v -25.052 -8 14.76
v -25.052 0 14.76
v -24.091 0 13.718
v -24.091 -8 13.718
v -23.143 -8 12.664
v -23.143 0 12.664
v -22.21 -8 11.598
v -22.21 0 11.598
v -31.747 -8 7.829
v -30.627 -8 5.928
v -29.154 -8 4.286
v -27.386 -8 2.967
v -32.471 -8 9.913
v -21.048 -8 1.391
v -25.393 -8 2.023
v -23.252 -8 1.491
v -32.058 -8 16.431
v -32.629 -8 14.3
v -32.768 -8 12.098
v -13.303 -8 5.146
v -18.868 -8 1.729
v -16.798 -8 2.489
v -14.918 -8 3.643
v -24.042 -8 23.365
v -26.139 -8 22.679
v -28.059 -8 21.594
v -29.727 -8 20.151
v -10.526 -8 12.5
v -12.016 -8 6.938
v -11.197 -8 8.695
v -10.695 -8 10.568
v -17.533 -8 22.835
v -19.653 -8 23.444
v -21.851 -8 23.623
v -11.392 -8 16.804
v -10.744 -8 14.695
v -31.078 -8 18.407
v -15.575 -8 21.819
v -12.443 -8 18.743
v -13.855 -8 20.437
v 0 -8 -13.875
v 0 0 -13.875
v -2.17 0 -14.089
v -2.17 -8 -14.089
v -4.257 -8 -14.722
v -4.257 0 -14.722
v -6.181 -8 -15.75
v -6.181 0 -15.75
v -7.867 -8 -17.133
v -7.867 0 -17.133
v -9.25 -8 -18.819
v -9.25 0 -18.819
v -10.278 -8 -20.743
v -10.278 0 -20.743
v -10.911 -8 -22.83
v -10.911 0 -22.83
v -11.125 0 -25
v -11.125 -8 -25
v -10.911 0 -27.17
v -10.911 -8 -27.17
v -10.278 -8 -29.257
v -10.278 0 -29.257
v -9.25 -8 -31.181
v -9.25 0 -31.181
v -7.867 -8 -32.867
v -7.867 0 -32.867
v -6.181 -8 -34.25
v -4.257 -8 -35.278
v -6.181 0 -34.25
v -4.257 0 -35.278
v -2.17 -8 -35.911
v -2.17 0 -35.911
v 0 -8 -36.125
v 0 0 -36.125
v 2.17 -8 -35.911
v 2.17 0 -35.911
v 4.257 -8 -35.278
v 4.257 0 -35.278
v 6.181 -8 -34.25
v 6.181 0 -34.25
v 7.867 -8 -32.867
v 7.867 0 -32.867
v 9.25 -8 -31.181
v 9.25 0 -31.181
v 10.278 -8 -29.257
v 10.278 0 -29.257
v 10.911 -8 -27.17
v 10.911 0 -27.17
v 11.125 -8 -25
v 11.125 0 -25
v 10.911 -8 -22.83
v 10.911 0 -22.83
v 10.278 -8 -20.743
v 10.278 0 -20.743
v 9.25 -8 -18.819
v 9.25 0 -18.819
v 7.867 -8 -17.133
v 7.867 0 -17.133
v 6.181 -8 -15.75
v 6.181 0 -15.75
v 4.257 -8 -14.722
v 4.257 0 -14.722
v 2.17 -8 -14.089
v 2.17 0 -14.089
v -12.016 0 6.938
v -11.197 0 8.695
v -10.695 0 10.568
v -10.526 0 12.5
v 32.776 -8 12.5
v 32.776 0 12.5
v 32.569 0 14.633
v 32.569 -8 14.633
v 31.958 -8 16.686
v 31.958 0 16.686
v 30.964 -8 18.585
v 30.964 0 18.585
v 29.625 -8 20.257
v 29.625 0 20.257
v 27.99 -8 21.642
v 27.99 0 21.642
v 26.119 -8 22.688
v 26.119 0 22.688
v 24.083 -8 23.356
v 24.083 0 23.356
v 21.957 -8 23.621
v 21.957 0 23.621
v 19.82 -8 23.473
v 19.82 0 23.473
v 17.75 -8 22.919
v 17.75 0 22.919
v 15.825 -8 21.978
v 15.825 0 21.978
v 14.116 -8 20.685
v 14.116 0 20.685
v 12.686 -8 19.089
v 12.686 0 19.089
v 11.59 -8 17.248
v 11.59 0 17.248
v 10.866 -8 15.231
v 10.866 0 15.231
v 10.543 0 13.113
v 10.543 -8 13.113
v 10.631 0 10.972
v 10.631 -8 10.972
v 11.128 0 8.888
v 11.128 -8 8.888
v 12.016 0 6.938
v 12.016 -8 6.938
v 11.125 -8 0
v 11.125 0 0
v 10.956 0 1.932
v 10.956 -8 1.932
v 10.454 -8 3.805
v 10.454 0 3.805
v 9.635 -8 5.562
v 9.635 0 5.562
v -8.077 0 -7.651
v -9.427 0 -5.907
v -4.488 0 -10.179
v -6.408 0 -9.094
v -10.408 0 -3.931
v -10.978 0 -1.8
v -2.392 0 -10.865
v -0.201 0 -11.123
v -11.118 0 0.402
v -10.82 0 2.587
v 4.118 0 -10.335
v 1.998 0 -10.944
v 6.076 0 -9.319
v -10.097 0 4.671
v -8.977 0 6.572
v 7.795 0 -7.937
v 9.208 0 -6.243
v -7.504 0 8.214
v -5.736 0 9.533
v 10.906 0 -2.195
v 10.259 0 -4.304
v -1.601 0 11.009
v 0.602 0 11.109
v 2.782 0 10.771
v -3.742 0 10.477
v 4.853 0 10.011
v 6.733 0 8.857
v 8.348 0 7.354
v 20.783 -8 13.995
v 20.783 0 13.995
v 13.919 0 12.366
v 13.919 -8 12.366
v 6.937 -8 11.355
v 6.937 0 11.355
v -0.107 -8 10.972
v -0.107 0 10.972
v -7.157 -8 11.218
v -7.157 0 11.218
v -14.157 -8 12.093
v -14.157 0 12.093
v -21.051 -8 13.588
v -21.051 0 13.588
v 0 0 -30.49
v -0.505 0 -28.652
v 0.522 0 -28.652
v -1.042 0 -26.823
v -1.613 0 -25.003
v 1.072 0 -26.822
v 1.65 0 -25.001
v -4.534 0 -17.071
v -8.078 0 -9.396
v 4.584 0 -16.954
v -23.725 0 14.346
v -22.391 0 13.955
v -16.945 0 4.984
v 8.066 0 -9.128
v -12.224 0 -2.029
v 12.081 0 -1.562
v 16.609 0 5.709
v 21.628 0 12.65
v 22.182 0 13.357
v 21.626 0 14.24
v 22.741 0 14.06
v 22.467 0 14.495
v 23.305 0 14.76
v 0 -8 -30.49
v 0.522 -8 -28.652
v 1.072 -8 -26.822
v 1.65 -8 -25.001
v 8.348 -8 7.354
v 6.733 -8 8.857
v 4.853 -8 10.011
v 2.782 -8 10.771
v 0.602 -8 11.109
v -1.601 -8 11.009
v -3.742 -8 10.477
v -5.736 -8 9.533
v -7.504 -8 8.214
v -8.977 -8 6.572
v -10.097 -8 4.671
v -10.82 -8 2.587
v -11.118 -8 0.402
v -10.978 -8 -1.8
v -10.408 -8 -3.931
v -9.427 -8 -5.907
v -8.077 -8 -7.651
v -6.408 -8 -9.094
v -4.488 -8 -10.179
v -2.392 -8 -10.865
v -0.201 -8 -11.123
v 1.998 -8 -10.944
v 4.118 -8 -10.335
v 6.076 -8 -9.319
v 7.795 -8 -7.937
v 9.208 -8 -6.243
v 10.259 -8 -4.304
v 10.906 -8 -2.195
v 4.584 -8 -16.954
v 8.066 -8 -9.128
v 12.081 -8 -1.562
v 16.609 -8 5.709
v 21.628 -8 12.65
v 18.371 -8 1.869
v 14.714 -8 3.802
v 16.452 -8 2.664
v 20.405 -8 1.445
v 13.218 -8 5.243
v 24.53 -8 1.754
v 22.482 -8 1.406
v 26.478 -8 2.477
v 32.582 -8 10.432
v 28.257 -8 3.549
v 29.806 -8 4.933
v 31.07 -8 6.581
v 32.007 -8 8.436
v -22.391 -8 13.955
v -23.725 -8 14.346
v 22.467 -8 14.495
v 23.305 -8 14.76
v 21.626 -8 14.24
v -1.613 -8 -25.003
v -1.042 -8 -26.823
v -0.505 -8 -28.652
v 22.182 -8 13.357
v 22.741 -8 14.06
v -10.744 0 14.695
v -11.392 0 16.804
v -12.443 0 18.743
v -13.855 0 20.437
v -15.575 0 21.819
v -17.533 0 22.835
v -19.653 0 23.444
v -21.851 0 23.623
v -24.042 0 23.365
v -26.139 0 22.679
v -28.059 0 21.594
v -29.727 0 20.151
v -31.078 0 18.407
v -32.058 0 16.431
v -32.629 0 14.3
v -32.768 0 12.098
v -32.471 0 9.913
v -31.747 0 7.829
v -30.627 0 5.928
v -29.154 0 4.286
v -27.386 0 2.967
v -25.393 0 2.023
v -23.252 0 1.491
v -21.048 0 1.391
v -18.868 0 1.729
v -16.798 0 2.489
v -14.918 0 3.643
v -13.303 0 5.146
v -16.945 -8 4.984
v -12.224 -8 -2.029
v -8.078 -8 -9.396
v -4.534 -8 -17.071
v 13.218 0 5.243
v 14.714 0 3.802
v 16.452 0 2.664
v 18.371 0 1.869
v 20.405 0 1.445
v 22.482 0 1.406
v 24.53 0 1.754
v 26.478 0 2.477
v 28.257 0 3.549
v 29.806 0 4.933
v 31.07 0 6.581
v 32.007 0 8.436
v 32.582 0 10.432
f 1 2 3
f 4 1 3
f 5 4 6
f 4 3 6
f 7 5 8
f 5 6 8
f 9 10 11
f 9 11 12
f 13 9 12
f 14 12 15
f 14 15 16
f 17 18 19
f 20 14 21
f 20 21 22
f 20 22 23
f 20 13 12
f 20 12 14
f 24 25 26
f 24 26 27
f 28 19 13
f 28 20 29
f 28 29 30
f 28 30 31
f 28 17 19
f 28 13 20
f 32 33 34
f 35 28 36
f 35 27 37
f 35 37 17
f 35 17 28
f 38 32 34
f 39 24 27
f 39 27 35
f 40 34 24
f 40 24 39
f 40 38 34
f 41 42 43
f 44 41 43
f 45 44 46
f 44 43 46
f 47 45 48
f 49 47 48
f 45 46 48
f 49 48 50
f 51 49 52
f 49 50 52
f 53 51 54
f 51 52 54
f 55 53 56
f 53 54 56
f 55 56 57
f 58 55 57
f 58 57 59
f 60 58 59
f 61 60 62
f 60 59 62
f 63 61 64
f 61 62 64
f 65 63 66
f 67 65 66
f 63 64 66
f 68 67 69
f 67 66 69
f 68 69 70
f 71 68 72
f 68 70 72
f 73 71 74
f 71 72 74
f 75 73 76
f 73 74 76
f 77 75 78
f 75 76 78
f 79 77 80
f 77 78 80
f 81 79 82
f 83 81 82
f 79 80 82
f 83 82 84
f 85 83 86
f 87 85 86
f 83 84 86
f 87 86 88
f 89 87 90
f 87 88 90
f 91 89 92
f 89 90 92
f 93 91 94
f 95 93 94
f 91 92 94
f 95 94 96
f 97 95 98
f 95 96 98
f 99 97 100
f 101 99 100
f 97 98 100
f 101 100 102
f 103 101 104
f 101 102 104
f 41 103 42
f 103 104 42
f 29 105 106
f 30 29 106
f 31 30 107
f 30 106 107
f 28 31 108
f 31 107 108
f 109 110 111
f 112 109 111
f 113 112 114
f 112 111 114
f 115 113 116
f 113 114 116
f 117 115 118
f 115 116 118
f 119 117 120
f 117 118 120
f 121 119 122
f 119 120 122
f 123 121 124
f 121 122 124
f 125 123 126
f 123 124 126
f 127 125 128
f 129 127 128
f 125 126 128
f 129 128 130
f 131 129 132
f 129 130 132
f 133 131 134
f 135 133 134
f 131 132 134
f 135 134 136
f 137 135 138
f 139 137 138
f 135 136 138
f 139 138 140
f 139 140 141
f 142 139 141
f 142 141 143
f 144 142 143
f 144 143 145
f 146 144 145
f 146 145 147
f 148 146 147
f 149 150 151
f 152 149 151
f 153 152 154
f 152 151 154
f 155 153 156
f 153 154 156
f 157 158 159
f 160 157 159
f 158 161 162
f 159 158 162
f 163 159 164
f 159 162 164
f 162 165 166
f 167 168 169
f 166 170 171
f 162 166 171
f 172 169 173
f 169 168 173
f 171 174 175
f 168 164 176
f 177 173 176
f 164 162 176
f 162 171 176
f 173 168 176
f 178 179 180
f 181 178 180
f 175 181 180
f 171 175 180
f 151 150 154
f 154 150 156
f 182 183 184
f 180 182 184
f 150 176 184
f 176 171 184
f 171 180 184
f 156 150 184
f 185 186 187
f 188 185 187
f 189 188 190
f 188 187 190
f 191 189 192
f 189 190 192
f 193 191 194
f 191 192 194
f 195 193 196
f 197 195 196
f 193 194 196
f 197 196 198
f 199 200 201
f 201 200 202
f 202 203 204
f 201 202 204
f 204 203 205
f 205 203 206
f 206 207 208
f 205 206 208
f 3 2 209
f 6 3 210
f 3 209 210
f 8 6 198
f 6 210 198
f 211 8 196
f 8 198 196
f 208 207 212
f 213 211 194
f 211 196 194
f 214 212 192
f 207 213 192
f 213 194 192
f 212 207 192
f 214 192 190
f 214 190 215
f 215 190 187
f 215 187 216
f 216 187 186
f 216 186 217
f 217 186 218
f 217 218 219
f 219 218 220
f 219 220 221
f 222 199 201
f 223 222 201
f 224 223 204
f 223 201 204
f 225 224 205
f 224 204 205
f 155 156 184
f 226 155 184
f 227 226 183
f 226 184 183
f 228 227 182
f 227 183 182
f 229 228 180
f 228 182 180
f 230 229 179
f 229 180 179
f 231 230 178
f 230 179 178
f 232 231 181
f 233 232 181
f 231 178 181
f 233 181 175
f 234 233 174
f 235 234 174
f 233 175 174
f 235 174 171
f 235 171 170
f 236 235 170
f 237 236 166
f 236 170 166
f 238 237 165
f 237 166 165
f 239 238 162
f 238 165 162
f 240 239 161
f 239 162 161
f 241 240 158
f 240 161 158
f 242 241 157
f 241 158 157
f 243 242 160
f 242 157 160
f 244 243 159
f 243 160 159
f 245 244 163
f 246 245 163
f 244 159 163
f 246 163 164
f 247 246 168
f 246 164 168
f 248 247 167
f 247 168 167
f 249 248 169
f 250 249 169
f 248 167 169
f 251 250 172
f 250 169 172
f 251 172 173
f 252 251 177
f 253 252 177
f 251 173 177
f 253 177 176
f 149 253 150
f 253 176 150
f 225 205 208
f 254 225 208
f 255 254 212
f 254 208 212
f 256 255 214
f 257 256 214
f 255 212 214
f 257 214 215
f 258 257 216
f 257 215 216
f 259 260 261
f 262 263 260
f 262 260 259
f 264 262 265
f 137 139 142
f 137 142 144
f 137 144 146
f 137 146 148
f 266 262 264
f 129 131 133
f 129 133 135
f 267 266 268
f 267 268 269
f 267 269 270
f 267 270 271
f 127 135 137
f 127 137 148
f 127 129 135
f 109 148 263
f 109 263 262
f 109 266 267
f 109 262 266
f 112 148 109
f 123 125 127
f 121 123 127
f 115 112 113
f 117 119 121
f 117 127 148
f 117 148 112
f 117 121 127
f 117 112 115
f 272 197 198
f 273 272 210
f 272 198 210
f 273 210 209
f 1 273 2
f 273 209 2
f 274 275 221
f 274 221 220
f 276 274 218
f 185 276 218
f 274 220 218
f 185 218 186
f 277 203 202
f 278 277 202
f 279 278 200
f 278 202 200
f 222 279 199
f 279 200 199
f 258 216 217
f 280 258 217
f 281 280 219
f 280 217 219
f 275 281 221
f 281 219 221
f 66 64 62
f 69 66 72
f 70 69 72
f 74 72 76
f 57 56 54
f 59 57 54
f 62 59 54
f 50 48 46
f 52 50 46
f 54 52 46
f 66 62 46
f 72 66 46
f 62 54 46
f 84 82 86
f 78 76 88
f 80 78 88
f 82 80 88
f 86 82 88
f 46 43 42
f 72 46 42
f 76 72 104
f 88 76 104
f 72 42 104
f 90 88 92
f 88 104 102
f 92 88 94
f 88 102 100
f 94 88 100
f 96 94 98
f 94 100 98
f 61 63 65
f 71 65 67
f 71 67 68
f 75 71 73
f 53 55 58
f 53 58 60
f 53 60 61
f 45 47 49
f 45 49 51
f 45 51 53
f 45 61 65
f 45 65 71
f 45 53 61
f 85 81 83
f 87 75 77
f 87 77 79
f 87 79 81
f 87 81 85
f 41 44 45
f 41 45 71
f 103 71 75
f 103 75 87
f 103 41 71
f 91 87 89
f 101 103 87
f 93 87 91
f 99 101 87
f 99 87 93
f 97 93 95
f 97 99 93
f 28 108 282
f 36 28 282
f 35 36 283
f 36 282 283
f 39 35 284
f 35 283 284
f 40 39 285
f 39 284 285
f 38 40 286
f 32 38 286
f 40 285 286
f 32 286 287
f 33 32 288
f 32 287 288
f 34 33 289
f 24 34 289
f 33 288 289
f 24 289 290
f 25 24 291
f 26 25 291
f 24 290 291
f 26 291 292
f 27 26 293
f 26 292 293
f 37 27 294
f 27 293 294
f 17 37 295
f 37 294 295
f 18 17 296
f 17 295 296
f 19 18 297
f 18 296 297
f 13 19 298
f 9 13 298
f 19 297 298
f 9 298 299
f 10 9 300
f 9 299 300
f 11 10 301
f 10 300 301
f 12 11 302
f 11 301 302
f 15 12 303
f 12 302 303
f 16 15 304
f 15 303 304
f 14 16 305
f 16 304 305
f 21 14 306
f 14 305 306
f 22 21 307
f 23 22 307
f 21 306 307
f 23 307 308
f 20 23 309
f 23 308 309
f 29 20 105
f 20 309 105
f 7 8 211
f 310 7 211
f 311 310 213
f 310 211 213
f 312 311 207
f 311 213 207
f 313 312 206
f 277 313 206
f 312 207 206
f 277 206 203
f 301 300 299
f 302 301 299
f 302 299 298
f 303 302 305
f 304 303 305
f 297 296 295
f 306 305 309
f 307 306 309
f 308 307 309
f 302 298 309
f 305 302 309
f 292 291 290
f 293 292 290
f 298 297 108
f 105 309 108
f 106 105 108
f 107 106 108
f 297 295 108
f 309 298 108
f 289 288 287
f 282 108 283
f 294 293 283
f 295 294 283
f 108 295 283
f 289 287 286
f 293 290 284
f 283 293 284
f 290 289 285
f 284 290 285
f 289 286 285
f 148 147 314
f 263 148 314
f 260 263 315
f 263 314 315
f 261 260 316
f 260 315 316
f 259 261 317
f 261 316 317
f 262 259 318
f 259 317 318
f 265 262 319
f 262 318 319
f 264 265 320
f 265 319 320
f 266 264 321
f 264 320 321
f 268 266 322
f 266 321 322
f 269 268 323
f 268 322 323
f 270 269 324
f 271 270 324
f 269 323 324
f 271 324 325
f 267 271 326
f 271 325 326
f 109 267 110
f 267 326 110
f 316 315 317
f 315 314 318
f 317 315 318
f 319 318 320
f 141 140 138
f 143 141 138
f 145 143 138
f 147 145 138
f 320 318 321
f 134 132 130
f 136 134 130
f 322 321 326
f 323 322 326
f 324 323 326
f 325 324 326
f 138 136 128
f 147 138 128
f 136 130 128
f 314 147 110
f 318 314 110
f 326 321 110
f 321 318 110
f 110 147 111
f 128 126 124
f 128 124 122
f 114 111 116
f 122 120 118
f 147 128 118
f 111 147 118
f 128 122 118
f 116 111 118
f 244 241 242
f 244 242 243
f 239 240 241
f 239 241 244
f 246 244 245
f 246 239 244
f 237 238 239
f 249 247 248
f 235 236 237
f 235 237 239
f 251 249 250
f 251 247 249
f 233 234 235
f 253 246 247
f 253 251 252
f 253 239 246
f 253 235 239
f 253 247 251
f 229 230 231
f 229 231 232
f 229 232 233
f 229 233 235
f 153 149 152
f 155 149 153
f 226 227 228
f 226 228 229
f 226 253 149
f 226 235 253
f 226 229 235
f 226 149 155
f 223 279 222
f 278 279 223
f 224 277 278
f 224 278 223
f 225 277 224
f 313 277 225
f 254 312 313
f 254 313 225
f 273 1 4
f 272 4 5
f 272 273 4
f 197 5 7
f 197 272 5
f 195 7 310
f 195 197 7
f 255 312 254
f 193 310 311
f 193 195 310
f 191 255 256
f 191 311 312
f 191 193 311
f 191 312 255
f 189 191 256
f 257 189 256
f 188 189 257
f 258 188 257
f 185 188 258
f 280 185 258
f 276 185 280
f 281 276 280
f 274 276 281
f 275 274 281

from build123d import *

# Parameters (mm, degrees)
F2_DEPTH = 8


with BuildPart() as f2:
    # F1 (on Front) → F2 (new body)
    with BuildSketch(Plane.XZ):
        with BuildLine():
            ThreePointArc((1.6496168674, -25.001052938), (0.0185421059, -25.0554093961), (-1.6126113213, -25.0034671305))
            ThreePointArc((-1.6126113213, -25.0034671305), (-0.76924926, -27.7359109748), (0, -30.4901376367))
            ThreePointArc((0, -30.4901376367), (0.7930786895, -27.7360596499), (1.6496168674, -25.001052938))
        make_face()
        with BuildLine():
            ThreePointArc((-22.2095475261, 11.597839562), (-10.0777383133, -5.6711235714), (-1.6126113213, -25.0034671305))
            ThreePointArc((-1.6126113213, -25.0034671305), (0.0185421059, -25.0554093961), (1.6496168674, -25.001052938))
            ThreePointArc((1.6496168674, -25.001052938), (10.0083170152, -5.3106119186), (21.6277983208, 12.6495938122))
            ThreePointArc((21.6277983208, 12.6495938122), (21.2158870276, 13.3289167395), (20.7826457315, 13.9948390565))
            ThreePointArc((20.7826457315, 13.9948390565), (-0.1065903299, 10.9717091805), (-21.0506176136, 13.5884282351))
            ThreePointArc((-21.0506176136, 13.5884282351), (-21.6529693759, 12.6064587027), (-22.2095475261, 11.597839562))
        make_face()
        with BuildLine():
            ThreePointArc((-25.0524058938, 14.7595563903), (-23.61510149, 13.1929721836), (-22.2095475261, 11.597839562))
            ThreePointArc((-22.2095475261, 11.597839562), (-21.6529693759, 12.6064587027), (-21.0506176136, 13.5884282351))
            ThreePointArc((-21.0506176136, 13.5884282351), (-23.0592408517, 14.1475816988), (-25.0524058938, 14.7595563903))
        make_face()
        with BuildLine():
            ThreePointArc((20.7826457315, 13.9948390565), (21.2158870276, 13.3289167395), (21.6277983208, 12.6495938122))
            ThreePointArc((21.6277983208, 12.6495938122), (22.4604471385, 13.7091322212), (23.3045648783, 14.7595563903))
            ThreePointArc((23.3045648783, 14.7595563903), (22.0467947412, 14.3666794572), (20.7826457315, 13.9948390565))
        make_face()
    extrude(amount=F2_DEPTH)


with BuildPart() as f2b:
    # F0 (on Front) → F2, piece 2 (new body)
    with BuildSketch(Plane.XZ):
        with BuildLine():
            ThreePointArc((11.125, -25), (7.8665629407, -17.1334370593), (0, -13.875))
            ThreePointArc((0, -13.875), (-7.8665629407, -32.8665629407), (11.125, -25))
        make_face()
    extrude(amount=F2_DEPTH)


with BuildPart() as f2c:
    # F0 (on Front) → F2, piece 3 (new body)
    with BuildSketch(Plane.XZ):
        with BuildLine():
            Line((0, 0), (9.6345326171, 5.5625))
            ThreePointArc((9.6345326171, 5.5625), (0, 11.125), (-9.6345326171, 5.5625))
            Line((-9.6345326171, 5.5625), (0, 0))
        make_face()
        with BuildLine():
            ThreePointArc((-9.6345326171, 5.5625), (-9.6345326171, -5.5625), (0, -11.125))
            Line((0, -11.125), (0, 0))
            Line((0, 0), (-9.6345326171, 5.5625))
        make_face()
        with BuildLine():
            ThreePointArc((0, -11.125), (7.8665629407, -7.8665629407), (11.125, 0))
            ThreePointArc((11.125, 0), (10.7459248175, 2.8793618768), (9.6345326171, 5.5625))
            Line((9.6345326171, 5.5625), (0, 0))
            Line((0, 0), (0, -11.125))
        make_face()
    extrude(amount=F2_DEPTH)


with BuildPart() as f2d:
    # F0 (on Front) → F2, piece 4 (new body)
    with BuildSketch(Plane.XZ):
        with BuildLine():
            ThreePointArc((-10.5256350946, 12.5), (-32.3965599121, 15.3793618768), (-12.0161024775, 6.9375))
            ThreePointArc((-12.0161024775, 6.9375), (-10.9047102771, 9.6206381232), (-10.5256350946, 12.5))
        make_face()
    extrude(amount=F2_DEPTH)


with BuildPart() as f2e:
    # F0 (on Front) → F2, piece 5 (new body)
    with BuildSketch(Plane.XZ):
        with BuildLine():
            ThreePointArc((32.7756350946, 12.5), (18.7712732178, 23.2459248175), (12.0161024775, 6.9375))
            ThreePointArc((12.0161024775, 6.9375), (24.5299969714, 1.7540751825), (32.7756350946, 12.5))
        make_face()
    extrude(amount=F2_DEPTH)


solid = Compound([f2.part, f2b.part, f2c.part, f2d.part, f2e.part])
